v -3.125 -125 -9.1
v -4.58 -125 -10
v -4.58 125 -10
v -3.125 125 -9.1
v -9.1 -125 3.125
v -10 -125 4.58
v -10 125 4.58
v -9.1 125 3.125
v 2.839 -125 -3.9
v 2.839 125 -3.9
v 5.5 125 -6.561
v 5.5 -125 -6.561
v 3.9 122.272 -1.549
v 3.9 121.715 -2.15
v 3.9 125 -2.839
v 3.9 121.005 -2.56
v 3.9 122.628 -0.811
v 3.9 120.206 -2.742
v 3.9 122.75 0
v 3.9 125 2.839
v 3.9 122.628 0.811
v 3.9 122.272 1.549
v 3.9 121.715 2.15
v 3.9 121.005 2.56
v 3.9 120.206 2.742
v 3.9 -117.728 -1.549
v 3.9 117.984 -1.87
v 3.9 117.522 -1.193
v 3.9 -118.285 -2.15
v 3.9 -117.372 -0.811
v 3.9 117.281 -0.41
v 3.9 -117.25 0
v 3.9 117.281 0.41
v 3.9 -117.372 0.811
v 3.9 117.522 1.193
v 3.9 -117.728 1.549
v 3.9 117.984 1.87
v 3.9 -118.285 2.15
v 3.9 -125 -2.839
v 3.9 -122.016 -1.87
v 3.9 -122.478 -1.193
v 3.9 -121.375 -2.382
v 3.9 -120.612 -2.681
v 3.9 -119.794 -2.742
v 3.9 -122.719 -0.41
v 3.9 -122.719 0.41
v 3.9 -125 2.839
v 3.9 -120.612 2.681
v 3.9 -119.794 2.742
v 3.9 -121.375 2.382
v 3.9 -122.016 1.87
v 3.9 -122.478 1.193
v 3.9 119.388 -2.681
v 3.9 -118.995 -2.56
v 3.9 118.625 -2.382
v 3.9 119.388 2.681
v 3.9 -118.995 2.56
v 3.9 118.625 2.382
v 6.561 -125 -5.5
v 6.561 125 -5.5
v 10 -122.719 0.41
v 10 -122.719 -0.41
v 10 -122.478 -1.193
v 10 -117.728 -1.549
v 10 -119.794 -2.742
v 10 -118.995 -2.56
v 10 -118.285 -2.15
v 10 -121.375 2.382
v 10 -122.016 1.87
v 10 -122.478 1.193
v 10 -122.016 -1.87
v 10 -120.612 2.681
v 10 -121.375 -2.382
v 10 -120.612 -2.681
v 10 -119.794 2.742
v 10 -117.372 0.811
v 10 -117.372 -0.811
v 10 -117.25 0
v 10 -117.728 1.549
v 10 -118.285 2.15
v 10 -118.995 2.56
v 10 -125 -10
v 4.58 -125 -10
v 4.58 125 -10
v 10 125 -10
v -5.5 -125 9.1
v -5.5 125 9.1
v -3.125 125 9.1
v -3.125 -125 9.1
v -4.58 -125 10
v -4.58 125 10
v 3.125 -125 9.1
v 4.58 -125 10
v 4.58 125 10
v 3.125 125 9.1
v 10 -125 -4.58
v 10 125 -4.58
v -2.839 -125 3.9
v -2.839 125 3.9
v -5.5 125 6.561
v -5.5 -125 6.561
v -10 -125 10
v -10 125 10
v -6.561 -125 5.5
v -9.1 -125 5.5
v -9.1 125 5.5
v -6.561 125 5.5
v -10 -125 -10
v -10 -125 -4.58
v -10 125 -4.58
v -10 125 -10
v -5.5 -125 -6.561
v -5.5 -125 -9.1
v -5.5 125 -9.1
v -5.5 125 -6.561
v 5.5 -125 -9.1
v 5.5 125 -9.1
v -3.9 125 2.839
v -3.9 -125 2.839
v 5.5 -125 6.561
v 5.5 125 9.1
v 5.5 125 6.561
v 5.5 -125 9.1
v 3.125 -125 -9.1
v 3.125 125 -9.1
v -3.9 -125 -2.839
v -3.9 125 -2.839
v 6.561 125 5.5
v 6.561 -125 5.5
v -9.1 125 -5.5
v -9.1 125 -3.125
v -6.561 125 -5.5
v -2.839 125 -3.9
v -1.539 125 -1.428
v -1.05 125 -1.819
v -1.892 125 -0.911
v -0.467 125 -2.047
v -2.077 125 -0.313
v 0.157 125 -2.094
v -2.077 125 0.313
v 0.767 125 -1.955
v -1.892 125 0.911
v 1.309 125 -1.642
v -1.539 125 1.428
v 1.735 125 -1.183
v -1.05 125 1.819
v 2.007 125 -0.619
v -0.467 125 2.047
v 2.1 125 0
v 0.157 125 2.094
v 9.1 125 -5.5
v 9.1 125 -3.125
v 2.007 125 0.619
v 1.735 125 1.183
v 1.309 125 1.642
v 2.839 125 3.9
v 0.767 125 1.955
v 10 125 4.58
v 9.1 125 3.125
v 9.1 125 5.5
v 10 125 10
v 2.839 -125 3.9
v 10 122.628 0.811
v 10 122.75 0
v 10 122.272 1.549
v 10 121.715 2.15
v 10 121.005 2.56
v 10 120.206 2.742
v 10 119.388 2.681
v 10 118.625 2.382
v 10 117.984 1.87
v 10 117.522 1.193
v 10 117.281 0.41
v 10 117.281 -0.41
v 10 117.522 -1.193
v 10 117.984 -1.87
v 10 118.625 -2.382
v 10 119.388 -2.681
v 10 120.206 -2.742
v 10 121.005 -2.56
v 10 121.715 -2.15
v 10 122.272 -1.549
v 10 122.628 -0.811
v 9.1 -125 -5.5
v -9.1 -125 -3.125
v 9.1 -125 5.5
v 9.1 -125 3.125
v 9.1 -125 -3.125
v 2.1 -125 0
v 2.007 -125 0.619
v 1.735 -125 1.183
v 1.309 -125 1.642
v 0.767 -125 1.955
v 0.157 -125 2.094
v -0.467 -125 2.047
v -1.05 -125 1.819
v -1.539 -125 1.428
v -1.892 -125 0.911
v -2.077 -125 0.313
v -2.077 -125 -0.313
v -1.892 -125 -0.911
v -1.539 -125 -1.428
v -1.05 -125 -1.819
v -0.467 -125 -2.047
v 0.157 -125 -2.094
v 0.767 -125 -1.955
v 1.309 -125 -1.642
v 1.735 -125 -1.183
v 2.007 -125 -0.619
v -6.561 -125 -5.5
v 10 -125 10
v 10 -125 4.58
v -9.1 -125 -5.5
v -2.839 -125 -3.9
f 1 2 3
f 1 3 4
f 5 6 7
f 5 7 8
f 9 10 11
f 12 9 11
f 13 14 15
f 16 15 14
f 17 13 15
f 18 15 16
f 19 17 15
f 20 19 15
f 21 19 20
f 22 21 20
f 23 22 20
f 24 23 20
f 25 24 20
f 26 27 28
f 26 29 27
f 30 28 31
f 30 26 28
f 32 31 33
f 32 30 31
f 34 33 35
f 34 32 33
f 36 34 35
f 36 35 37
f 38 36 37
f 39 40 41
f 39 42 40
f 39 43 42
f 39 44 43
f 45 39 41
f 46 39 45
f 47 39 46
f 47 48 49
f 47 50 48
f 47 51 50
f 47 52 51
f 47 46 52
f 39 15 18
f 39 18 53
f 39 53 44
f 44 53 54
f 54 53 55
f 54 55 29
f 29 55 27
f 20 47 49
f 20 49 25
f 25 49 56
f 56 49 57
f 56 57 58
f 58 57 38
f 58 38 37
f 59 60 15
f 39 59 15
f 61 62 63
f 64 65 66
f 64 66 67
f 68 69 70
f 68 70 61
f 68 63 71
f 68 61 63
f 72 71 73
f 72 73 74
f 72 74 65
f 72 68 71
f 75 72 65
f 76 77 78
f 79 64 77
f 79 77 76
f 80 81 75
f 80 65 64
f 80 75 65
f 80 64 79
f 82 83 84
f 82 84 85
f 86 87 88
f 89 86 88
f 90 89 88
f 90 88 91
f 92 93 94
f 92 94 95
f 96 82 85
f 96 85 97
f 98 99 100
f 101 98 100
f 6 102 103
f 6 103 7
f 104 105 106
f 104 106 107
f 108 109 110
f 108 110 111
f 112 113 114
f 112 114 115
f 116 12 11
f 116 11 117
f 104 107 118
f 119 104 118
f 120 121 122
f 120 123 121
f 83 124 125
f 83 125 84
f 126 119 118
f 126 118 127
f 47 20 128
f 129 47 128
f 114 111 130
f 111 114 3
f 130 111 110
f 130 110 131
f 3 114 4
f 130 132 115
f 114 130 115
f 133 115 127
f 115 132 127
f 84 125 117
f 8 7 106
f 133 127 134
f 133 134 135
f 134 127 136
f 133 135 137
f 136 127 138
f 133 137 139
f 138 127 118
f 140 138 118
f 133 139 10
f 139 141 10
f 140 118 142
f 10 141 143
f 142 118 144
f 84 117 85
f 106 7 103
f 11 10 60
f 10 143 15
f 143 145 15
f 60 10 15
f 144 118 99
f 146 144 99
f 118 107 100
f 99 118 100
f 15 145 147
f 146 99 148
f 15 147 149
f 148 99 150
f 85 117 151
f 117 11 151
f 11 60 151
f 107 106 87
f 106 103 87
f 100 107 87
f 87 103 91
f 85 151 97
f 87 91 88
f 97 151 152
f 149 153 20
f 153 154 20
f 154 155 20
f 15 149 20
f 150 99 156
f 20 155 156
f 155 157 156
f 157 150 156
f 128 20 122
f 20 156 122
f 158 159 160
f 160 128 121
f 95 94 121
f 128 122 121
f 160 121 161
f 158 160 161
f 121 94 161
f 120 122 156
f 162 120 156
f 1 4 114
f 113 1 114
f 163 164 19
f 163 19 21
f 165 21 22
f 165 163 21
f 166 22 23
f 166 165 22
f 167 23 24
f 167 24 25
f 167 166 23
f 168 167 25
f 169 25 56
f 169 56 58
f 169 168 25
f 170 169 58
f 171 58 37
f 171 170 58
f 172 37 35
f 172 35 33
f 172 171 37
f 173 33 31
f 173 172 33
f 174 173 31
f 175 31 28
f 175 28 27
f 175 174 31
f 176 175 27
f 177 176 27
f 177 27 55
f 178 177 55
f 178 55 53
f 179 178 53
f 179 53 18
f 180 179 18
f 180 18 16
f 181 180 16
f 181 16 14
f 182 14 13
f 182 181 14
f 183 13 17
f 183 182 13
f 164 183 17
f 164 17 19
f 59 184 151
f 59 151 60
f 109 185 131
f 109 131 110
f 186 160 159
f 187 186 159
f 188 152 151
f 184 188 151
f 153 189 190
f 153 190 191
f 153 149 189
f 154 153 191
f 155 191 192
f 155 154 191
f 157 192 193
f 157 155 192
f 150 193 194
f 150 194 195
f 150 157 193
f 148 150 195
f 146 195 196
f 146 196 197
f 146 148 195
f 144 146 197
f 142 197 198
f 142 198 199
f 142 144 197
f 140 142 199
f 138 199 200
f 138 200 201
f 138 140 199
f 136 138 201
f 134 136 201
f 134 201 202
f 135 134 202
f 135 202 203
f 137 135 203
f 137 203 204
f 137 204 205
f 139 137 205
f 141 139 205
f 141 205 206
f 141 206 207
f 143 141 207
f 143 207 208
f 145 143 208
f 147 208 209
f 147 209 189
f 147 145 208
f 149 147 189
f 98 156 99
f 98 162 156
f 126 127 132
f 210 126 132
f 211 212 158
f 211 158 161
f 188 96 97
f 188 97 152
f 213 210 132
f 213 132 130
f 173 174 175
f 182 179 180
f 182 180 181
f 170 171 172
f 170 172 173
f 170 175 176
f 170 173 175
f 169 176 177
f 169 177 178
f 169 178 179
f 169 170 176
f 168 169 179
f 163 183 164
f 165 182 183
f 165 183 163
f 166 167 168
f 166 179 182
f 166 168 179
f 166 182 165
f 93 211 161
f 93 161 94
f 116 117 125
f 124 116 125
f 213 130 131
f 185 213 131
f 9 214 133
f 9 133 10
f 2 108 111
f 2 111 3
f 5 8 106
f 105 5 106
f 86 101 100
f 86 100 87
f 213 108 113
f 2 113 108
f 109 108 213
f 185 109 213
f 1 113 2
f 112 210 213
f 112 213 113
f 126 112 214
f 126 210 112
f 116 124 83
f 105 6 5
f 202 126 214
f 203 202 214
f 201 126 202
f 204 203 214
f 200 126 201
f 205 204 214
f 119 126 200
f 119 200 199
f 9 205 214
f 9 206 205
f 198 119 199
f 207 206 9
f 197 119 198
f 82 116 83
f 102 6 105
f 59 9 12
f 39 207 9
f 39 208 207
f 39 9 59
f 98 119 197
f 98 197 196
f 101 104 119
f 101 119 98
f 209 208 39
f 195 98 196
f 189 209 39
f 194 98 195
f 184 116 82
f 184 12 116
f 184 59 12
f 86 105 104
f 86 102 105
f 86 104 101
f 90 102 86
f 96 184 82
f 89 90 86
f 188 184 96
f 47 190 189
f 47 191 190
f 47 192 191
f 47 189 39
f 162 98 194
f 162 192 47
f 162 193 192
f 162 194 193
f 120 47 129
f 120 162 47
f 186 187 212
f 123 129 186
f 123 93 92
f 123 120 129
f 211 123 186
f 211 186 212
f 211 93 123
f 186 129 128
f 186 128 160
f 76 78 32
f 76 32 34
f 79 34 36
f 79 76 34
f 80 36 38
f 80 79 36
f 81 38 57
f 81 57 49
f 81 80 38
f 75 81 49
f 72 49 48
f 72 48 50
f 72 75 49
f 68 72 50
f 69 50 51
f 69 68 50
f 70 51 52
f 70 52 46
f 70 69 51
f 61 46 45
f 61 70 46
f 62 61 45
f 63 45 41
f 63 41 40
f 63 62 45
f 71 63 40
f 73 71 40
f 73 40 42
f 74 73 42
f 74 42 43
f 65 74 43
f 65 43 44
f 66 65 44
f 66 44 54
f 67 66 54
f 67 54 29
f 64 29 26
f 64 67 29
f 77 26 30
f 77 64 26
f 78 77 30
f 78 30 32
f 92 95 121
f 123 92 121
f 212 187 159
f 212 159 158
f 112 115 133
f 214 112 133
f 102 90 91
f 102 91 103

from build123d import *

# Parameters (mm, degrees)
F0_R     = 2.1
F1_DEPTH = 125
F2_R     = 2.75
F3_DEPTH = 6.1


with BuildPart() as f1:
    # F0 (on Front) → F1 (new body, symmetric)
    with BuildSketch(Plane.XZ):
        Polygon((3.9, 2.83934), (3.9, 3.9), (2.83934, 3.9), (-2.83934, 3.9), (-3.9, 3.9), (-3.9, 2.83934), (-3.9, -2.83934), (-3.9, -3.9), (-2.83934, -3.9), (2.83934, -3.9), (3.9, -3.9), (3.9, -2.83934), align=None)
        Circle(F0_R, mode=Mode.SUBTRACT)
        Polygon((2.83934, 3.9), (3.9, 3.9), (3.9, 2.83934), (6.56066, 5.5), (9.1, 5.5), (9.1, 3.125), (10, 4.58), (10, 10), (4.58, 10), (3.125, 9.1), (5.5, 9.1), (5.5, 6.56066), align=None)
        Polygon((-3.9, 3.9), (-2.83934, 3.9), (-5.5, 6.56066), (-5.5, 9.1), (-3.125, 9.1), (-4.58, 10), (-10, 10), (-10, 4.58), (-9.1, 3.125), (-9.1, 5.5), (-6.56066, 5.5), (-3.9, 2.83934), align=None)
        Polygon((6.56066, -5.5), (3.9, -2.83934), (3.9, -3.9), (2.83934, -3.9), (5.5, -6.56066), (5.5, -9.1), (3.125, -9.1), (4.58, -10), (10, -10), (10, -4.58), (9.1, -3.125), (9.1, -5.5), align=None)
        Polygon((-3.9, -3.9), (-3.9, -2.83934), (-6.56066, -5.5), (-9.1, -5.5), (-9.1, -3.125), (-10, -4.58), (-10, -10), (-4.58, -10), (-3.125, -9.1), (-5.5, -9.1), (-5.5, -6.56066), (-2.83934, -3.9), align=None)
    extrude(amount=F1_DEPTH, both=True)

    # F2 (on face) → F3 (join, through all)
    with BuildSketch(Plane.YZ.offset(10)):
        with Locations((-120, 0)):
            Circle(F2_R)
        with Locations((120, 0)):
            Circle(F2_R)
    extrude(amount=-F3_DEPTH)


solid = f1.part
